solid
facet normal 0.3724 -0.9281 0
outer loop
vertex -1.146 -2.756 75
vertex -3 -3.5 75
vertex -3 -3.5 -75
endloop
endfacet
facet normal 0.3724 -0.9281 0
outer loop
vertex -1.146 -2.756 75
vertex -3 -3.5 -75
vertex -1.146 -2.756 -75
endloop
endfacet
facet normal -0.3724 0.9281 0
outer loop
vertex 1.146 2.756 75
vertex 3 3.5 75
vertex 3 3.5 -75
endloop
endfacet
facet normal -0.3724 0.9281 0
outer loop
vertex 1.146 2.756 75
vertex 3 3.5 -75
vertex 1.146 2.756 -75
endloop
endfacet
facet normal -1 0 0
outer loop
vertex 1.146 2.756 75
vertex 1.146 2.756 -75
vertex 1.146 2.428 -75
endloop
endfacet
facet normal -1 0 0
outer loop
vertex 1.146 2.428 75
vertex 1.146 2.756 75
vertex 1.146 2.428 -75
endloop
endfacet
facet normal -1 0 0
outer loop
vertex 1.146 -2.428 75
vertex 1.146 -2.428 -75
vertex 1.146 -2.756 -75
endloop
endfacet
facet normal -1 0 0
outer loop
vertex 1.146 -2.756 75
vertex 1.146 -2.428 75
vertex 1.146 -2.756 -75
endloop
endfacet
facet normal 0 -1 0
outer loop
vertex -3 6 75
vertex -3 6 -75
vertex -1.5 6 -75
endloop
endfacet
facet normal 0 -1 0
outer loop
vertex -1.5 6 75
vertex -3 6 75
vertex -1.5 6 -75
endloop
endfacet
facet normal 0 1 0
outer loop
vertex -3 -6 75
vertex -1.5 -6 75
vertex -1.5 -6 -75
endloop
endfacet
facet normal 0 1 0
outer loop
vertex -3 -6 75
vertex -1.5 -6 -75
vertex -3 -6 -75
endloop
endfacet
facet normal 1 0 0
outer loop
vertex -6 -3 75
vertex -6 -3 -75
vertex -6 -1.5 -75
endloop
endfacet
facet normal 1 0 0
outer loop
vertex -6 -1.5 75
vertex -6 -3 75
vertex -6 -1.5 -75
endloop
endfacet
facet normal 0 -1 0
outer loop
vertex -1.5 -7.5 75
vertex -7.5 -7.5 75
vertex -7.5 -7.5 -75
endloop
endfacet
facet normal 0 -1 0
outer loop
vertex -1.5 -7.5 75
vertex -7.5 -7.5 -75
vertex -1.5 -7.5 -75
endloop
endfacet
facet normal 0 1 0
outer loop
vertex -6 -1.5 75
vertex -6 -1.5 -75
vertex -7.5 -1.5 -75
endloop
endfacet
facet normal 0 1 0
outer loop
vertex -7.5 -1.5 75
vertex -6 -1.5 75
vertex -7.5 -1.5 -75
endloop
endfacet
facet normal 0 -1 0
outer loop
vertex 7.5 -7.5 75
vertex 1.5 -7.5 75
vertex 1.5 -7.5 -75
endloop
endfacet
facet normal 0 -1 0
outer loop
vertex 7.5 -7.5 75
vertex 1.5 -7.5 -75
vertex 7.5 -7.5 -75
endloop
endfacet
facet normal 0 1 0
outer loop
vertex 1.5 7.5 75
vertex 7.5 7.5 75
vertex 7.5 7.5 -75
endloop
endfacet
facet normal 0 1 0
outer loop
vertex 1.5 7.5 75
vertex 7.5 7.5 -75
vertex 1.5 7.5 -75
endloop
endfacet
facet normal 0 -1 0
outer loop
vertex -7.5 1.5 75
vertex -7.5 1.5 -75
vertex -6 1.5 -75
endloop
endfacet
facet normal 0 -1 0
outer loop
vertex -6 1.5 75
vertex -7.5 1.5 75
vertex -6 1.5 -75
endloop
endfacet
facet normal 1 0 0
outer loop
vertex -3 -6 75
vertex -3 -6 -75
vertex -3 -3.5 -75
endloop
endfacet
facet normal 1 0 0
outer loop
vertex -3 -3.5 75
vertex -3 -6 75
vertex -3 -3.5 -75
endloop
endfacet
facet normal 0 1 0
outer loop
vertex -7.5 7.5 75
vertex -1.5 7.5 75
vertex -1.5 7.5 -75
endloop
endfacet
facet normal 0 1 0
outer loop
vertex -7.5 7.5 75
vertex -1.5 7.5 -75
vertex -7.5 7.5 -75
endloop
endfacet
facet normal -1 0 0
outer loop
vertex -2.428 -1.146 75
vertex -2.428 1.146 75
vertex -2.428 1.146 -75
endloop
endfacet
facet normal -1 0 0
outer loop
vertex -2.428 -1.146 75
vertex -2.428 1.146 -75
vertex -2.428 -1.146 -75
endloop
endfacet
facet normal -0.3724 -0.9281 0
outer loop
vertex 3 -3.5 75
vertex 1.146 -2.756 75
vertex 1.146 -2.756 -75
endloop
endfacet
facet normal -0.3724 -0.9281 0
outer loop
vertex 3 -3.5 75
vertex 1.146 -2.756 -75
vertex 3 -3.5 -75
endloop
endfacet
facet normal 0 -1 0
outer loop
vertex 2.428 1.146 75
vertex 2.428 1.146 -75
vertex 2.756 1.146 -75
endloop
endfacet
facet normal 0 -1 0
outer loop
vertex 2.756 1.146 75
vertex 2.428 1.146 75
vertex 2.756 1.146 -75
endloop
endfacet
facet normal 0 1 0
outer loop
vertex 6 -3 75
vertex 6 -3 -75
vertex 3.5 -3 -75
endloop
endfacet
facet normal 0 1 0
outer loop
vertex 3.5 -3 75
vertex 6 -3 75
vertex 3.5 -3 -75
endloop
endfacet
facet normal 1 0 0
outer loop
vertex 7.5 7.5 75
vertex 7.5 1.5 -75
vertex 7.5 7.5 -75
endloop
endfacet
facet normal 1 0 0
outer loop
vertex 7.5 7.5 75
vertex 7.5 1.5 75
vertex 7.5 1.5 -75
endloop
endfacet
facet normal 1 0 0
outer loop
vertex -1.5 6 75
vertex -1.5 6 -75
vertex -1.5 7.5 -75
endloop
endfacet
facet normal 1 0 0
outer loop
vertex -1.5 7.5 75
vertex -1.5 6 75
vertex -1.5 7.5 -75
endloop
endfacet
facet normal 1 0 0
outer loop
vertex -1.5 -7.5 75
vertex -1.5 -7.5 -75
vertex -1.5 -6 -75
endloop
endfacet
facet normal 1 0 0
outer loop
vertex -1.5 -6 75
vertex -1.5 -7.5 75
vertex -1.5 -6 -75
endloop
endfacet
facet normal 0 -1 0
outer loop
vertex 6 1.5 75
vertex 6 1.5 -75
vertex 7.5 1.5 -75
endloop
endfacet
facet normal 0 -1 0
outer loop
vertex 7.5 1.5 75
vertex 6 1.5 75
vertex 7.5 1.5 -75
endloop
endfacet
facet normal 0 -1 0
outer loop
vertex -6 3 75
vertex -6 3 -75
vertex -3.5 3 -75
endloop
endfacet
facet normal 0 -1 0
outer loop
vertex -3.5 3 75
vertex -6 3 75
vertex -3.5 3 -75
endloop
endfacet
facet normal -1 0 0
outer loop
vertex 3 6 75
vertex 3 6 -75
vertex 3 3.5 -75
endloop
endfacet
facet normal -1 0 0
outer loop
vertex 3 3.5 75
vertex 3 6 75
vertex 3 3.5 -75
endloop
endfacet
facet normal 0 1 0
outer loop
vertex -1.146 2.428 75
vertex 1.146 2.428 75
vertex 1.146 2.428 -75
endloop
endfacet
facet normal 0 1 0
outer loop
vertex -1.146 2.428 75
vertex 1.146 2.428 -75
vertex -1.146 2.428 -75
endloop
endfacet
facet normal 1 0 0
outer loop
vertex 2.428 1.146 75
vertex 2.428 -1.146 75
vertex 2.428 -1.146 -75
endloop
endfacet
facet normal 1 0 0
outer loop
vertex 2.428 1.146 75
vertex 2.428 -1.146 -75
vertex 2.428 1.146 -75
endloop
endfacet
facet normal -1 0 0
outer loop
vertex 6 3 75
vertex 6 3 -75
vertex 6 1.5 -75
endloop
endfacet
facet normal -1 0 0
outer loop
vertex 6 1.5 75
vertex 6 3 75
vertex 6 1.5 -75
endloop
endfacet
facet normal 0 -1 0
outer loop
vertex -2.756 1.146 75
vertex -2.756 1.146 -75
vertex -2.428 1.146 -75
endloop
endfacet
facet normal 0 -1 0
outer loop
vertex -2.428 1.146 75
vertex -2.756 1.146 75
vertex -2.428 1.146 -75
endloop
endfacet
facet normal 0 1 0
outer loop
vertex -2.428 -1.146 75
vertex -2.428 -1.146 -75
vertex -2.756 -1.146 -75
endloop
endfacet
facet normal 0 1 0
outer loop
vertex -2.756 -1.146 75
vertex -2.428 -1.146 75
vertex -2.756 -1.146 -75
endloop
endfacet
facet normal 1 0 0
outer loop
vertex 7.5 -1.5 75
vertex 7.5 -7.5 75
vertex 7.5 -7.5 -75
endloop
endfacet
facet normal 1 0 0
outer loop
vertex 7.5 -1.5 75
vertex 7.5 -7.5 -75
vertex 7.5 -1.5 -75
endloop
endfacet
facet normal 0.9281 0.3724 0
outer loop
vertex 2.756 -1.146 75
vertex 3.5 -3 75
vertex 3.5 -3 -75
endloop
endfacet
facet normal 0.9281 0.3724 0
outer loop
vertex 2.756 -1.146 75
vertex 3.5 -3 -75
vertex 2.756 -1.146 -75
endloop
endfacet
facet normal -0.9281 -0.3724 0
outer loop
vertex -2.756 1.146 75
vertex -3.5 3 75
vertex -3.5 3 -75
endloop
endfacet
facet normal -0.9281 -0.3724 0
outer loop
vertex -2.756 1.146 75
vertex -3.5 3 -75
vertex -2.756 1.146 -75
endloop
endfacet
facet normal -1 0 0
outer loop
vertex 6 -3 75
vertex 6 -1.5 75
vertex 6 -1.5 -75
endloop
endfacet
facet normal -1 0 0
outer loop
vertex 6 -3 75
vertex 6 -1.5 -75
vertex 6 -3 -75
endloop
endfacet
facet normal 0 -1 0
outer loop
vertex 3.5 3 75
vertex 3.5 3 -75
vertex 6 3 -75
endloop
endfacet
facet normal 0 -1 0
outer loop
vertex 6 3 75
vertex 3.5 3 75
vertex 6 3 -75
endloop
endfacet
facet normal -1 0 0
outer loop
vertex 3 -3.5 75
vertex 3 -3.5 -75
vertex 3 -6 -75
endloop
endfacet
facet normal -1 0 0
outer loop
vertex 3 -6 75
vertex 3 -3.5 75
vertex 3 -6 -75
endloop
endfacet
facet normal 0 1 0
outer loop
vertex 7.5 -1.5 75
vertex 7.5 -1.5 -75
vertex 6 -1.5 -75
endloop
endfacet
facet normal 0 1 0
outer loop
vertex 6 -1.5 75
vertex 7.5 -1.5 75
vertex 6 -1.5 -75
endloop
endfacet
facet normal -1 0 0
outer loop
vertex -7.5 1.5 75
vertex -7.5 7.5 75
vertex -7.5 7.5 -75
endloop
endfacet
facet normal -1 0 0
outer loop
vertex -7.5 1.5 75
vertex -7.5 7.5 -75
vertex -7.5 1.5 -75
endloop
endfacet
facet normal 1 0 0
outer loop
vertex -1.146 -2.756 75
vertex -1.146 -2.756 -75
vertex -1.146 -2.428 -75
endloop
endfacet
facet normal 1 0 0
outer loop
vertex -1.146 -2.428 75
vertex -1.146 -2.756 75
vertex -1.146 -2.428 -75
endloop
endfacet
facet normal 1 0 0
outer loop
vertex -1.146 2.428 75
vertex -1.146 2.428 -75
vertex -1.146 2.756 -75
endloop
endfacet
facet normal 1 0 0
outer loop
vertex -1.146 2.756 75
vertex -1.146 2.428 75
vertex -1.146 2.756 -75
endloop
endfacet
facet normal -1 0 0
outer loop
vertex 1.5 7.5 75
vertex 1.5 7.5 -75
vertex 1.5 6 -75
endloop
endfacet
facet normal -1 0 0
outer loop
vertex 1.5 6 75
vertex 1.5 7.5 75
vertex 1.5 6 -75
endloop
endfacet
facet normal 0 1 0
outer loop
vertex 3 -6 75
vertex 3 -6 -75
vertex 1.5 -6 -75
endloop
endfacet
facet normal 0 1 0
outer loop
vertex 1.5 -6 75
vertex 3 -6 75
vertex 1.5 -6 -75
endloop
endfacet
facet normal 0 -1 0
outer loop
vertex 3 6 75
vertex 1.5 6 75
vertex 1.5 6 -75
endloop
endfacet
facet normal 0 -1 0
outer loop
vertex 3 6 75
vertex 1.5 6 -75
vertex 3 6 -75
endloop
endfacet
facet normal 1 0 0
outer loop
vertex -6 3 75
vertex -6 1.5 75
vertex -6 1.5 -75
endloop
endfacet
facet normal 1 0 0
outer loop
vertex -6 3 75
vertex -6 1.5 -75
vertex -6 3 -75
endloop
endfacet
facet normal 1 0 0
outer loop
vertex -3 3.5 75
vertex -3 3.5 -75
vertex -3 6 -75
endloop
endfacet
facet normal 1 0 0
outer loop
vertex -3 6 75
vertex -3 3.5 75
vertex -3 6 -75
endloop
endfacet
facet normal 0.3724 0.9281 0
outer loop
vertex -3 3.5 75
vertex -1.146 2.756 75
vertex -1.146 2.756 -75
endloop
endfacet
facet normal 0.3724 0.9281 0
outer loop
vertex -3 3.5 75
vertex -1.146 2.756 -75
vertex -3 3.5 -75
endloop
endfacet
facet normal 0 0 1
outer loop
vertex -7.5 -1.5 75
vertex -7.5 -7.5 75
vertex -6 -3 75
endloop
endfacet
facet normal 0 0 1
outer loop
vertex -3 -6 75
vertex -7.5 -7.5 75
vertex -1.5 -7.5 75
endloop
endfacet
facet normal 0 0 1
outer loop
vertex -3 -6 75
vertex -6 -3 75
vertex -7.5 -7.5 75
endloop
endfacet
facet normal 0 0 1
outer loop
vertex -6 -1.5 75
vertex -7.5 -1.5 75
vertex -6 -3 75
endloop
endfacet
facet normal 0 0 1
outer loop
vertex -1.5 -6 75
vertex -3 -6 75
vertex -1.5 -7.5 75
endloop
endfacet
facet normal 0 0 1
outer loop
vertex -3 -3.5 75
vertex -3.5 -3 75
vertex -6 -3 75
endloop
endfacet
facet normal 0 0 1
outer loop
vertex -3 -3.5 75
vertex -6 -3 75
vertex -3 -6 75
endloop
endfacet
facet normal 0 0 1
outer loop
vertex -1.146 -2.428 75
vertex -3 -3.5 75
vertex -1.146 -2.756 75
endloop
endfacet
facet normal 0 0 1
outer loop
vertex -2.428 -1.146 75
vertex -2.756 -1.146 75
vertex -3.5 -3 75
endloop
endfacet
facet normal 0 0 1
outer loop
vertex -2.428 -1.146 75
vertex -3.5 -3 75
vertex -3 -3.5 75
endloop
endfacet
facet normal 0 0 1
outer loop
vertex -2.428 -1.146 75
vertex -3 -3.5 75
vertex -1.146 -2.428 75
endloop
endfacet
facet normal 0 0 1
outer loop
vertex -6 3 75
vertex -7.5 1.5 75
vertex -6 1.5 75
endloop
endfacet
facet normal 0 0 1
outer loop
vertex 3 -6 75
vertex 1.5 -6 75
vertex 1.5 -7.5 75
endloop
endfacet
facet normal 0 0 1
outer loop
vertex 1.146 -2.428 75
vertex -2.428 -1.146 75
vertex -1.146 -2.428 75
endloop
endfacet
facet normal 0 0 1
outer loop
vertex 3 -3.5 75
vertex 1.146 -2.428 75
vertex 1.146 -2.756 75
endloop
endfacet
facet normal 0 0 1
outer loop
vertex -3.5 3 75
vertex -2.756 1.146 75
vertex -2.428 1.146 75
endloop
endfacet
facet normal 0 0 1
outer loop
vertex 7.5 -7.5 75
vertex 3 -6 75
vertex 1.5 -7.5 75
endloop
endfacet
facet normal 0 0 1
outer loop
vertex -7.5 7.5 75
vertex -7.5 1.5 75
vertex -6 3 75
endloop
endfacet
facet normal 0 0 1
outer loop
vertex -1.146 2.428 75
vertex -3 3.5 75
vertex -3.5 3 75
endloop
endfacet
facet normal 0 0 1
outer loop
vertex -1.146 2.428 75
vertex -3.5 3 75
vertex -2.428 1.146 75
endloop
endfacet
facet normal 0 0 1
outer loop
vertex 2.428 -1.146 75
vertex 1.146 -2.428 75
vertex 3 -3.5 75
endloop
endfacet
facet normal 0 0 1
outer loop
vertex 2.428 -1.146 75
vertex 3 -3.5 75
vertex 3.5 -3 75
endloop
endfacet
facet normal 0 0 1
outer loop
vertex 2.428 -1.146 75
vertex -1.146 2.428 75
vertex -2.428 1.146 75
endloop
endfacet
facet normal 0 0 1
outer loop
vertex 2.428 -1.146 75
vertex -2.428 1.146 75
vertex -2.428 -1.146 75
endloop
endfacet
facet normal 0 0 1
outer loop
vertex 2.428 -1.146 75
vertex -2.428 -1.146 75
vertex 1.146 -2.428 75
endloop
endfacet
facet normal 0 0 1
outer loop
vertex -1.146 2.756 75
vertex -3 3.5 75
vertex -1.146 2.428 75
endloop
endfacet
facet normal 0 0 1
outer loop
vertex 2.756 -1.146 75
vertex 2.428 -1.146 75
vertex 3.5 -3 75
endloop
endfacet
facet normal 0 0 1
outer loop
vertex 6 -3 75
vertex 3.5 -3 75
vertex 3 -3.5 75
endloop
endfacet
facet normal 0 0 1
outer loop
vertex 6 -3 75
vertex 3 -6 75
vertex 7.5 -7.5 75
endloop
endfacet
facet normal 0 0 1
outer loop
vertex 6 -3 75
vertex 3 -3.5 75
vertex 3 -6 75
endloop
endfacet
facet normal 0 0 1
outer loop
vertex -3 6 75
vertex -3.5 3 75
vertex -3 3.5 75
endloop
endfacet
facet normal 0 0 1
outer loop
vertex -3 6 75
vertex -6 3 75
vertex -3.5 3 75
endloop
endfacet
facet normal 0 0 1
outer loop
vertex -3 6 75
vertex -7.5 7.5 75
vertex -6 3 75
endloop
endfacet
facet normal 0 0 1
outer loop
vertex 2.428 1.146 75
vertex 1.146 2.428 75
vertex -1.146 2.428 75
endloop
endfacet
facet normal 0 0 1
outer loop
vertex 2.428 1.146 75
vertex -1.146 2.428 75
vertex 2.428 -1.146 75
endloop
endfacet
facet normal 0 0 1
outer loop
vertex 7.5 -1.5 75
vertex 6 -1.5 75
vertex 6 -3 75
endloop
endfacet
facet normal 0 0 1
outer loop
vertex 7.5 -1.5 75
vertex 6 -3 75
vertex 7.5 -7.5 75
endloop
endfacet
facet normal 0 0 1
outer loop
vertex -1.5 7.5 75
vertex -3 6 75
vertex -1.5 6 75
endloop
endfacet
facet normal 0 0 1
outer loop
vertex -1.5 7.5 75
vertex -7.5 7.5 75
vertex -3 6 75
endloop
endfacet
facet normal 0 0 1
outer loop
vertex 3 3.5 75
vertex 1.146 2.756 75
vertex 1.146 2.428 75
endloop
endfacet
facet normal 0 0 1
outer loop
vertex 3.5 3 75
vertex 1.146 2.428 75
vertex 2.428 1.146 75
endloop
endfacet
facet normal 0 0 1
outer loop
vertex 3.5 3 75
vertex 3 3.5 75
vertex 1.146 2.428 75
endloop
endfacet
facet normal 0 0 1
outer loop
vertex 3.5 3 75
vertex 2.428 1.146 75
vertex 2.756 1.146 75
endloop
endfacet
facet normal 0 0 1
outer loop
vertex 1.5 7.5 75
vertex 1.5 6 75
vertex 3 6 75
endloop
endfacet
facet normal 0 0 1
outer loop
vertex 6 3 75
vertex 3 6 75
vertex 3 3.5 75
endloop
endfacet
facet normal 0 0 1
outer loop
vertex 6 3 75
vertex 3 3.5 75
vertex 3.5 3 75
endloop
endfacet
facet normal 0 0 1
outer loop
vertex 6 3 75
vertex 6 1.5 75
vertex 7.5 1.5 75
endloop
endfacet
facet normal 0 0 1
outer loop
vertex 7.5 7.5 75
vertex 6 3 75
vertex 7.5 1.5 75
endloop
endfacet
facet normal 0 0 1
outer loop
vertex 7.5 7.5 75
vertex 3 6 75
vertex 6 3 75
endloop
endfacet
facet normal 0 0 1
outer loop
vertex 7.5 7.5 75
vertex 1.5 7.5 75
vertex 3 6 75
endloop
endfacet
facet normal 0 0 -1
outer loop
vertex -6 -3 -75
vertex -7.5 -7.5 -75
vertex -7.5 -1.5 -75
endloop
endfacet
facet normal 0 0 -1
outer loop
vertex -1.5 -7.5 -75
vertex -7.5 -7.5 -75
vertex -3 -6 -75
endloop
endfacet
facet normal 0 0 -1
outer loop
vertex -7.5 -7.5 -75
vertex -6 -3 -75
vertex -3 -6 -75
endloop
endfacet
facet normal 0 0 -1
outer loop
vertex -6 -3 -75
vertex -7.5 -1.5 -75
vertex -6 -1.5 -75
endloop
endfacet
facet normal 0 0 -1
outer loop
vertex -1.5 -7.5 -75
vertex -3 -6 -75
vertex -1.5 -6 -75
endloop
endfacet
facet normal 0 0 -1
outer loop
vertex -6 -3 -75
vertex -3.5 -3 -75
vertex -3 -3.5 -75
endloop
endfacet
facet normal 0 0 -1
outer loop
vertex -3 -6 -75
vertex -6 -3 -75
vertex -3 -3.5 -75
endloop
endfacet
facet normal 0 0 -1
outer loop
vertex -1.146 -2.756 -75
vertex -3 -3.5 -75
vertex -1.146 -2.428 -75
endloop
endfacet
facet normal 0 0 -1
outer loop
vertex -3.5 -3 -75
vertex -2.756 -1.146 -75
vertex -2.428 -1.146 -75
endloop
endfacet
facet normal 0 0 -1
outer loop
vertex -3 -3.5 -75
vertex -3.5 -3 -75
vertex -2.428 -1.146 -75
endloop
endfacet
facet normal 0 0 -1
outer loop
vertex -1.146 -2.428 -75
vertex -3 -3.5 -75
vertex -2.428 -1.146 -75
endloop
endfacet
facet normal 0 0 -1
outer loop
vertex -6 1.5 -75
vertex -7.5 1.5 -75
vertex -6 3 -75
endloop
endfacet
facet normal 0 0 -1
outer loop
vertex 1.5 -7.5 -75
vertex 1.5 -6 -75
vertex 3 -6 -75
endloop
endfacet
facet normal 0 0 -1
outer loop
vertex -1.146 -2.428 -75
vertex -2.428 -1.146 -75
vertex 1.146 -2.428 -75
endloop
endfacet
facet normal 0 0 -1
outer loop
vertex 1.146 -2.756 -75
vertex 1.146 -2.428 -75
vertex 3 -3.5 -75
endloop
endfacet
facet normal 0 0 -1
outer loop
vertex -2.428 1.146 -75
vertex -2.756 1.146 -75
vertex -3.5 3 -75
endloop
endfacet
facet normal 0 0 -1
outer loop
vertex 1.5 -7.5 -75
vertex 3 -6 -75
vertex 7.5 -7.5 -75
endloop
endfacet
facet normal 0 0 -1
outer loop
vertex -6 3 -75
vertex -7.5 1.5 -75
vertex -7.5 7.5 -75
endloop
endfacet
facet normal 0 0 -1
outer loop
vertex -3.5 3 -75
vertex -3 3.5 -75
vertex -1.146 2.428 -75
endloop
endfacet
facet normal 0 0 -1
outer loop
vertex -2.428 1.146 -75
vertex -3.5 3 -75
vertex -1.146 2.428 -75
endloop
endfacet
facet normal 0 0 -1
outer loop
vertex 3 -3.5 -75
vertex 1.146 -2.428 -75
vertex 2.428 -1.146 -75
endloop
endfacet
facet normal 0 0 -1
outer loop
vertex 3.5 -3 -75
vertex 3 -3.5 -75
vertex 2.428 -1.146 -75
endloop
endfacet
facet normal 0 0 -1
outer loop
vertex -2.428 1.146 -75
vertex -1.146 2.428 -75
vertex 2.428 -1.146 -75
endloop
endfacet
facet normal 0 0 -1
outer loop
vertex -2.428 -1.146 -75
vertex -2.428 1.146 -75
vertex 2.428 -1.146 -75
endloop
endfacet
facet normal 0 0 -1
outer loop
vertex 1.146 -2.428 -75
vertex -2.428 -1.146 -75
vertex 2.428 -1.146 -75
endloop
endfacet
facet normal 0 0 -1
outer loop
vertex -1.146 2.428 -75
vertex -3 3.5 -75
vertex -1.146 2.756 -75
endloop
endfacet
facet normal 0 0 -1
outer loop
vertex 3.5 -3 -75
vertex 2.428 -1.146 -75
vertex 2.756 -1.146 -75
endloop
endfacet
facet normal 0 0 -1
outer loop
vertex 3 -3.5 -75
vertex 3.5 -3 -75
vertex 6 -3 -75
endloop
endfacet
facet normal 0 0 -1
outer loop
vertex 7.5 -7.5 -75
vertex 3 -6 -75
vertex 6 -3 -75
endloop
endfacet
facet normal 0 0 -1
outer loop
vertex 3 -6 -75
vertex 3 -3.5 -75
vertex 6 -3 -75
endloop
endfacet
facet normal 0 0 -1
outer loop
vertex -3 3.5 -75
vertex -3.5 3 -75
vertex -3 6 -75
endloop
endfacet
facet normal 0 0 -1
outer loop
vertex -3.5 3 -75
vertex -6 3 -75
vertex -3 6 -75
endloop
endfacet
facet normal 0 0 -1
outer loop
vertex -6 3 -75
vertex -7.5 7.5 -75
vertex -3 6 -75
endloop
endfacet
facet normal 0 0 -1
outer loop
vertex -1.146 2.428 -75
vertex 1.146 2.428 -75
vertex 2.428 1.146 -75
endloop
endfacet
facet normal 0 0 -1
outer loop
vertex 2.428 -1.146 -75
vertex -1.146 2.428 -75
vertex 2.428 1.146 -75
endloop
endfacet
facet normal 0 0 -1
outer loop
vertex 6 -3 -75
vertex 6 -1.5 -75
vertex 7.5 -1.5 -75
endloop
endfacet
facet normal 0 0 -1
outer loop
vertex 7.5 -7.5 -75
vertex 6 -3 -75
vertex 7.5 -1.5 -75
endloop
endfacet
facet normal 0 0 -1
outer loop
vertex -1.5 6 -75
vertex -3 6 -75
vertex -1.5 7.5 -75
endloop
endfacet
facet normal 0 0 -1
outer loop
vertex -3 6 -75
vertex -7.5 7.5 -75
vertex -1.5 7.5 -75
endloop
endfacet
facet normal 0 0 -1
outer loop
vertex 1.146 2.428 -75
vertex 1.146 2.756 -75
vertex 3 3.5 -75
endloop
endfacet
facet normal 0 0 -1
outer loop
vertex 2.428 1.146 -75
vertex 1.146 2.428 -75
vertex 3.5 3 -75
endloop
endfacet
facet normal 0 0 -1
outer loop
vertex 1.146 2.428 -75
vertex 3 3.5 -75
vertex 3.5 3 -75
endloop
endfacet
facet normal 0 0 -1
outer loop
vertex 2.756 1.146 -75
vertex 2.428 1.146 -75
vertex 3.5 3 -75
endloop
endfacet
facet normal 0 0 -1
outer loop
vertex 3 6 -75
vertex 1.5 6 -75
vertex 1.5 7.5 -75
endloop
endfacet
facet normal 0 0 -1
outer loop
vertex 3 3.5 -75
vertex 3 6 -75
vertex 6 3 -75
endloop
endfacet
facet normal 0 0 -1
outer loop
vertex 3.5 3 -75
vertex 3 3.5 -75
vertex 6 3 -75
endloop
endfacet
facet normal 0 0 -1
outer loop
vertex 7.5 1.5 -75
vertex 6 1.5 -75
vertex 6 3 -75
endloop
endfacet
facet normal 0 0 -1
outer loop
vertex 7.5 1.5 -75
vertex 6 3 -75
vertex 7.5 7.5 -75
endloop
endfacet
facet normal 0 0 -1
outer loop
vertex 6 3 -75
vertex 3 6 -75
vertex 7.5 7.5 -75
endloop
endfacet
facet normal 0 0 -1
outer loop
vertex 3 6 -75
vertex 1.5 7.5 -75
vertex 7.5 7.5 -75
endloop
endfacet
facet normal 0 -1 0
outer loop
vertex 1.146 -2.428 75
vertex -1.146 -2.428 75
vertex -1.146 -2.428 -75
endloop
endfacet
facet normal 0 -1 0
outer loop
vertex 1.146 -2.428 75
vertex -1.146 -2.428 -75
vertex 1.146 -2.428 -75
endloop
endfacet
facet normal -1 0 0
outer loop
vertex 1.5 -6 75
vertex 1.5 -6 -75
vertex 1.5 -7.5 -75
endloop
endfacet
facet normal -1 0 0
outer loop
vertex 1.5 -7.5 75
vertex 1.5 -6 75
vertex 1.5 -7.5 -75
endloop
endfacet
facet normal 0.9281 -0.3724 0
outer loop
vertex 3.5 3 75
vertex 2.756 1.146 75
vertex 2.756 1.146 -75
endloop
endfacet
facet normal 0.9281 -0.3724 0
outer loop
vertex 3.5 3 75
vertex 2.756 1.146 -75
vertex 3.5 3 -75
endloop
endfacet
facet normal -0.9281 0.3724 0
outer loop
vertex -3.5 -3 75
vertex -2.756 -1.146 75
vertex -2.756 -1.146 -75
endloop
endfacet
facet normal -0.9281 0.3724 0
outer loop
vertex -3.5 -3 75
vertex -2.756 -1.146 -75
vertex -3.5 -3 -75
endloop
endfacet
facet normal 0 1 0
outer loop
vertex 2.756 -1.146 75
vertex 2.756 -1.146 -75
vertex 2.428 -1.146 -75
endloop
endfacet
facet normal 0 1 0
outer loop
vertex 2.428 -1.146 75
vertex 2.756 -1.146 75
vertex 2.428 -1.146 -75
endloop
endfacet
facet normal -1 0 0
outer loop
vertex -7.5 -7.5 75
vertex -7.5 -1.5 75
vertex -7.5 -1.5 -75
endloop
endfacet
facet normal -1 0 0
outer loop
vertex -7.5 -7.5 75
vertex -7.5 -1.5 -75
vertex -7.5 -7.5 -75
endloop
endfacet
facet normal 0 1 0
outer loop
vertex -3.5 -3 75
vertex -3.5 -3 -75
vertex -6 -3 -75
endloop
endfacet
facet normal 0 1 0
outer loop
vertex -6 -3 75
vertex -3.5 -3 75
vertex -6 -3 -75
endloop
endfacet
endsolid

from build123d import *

# Parameters (mm, degrees)
F1_DEPTH = 75


# Not quite as in the source:
# - ends of sketch curves that miss each other by under 0.0002 mm in the source are joined


with BuildPart() as f1:
    # F0 (on Top) → F1 (new body, symmetric)
    with BuildSketch(Plane.XY):
        Polygon((7.5, 1.5), (7.5, 7.5), (1.5, 7.5), (1.5, 6), (3, 6), (3, 3.5), (1.1461396934, 2.7563427575), (1.1461396934, 2.42764467), (-1.1461396934, 2.42764467), (-1.1461396934, 2.7563427575), (-3, 3.5), (-3, 6), (-1.5, 6), (-1.5, 7.5), (-7.5, 7.5), (-7.5, 1.5), (-6, 1.5), (-6, 3), (-3.5, 3), (-2.7563427575, 1.1461396934), (-2.42764467, 1.1461396934), (-2.42764467, -1.1461396934), (-2.7563427575, -1.1461396934), (-3.5, -3), (-6, -3), (-6, -1.5), (-7.5, -1.5), (-7.5, -7.5), (-1.5, -7.5), (-1.5, -6), (-3, -6), (-3, -3.5), (-1.1461396934, -2.7563427575), (-1.1461396934, -2.42764467), (1.1461396934, -2.42764467), (1.1461396934, -2.7563427575), (3, -3.5), (3, -6), (1.5, -6), (1.5, -7.5), (7.5, -7.5), (7.5, -1.5), (6, -1.5), (6, -3), (3.5, -3), (2.7563427575, -1.1461396934), (2.42764467, -1.1461396934), (2.42764467, 1.1461396934), (2.7563427575, 1.1461396934), (3.5, 3), (6, 3), (6, 1.5), align=None)
    extrude(amount=F1_DEPTH, both=True)


solid = f1.part
